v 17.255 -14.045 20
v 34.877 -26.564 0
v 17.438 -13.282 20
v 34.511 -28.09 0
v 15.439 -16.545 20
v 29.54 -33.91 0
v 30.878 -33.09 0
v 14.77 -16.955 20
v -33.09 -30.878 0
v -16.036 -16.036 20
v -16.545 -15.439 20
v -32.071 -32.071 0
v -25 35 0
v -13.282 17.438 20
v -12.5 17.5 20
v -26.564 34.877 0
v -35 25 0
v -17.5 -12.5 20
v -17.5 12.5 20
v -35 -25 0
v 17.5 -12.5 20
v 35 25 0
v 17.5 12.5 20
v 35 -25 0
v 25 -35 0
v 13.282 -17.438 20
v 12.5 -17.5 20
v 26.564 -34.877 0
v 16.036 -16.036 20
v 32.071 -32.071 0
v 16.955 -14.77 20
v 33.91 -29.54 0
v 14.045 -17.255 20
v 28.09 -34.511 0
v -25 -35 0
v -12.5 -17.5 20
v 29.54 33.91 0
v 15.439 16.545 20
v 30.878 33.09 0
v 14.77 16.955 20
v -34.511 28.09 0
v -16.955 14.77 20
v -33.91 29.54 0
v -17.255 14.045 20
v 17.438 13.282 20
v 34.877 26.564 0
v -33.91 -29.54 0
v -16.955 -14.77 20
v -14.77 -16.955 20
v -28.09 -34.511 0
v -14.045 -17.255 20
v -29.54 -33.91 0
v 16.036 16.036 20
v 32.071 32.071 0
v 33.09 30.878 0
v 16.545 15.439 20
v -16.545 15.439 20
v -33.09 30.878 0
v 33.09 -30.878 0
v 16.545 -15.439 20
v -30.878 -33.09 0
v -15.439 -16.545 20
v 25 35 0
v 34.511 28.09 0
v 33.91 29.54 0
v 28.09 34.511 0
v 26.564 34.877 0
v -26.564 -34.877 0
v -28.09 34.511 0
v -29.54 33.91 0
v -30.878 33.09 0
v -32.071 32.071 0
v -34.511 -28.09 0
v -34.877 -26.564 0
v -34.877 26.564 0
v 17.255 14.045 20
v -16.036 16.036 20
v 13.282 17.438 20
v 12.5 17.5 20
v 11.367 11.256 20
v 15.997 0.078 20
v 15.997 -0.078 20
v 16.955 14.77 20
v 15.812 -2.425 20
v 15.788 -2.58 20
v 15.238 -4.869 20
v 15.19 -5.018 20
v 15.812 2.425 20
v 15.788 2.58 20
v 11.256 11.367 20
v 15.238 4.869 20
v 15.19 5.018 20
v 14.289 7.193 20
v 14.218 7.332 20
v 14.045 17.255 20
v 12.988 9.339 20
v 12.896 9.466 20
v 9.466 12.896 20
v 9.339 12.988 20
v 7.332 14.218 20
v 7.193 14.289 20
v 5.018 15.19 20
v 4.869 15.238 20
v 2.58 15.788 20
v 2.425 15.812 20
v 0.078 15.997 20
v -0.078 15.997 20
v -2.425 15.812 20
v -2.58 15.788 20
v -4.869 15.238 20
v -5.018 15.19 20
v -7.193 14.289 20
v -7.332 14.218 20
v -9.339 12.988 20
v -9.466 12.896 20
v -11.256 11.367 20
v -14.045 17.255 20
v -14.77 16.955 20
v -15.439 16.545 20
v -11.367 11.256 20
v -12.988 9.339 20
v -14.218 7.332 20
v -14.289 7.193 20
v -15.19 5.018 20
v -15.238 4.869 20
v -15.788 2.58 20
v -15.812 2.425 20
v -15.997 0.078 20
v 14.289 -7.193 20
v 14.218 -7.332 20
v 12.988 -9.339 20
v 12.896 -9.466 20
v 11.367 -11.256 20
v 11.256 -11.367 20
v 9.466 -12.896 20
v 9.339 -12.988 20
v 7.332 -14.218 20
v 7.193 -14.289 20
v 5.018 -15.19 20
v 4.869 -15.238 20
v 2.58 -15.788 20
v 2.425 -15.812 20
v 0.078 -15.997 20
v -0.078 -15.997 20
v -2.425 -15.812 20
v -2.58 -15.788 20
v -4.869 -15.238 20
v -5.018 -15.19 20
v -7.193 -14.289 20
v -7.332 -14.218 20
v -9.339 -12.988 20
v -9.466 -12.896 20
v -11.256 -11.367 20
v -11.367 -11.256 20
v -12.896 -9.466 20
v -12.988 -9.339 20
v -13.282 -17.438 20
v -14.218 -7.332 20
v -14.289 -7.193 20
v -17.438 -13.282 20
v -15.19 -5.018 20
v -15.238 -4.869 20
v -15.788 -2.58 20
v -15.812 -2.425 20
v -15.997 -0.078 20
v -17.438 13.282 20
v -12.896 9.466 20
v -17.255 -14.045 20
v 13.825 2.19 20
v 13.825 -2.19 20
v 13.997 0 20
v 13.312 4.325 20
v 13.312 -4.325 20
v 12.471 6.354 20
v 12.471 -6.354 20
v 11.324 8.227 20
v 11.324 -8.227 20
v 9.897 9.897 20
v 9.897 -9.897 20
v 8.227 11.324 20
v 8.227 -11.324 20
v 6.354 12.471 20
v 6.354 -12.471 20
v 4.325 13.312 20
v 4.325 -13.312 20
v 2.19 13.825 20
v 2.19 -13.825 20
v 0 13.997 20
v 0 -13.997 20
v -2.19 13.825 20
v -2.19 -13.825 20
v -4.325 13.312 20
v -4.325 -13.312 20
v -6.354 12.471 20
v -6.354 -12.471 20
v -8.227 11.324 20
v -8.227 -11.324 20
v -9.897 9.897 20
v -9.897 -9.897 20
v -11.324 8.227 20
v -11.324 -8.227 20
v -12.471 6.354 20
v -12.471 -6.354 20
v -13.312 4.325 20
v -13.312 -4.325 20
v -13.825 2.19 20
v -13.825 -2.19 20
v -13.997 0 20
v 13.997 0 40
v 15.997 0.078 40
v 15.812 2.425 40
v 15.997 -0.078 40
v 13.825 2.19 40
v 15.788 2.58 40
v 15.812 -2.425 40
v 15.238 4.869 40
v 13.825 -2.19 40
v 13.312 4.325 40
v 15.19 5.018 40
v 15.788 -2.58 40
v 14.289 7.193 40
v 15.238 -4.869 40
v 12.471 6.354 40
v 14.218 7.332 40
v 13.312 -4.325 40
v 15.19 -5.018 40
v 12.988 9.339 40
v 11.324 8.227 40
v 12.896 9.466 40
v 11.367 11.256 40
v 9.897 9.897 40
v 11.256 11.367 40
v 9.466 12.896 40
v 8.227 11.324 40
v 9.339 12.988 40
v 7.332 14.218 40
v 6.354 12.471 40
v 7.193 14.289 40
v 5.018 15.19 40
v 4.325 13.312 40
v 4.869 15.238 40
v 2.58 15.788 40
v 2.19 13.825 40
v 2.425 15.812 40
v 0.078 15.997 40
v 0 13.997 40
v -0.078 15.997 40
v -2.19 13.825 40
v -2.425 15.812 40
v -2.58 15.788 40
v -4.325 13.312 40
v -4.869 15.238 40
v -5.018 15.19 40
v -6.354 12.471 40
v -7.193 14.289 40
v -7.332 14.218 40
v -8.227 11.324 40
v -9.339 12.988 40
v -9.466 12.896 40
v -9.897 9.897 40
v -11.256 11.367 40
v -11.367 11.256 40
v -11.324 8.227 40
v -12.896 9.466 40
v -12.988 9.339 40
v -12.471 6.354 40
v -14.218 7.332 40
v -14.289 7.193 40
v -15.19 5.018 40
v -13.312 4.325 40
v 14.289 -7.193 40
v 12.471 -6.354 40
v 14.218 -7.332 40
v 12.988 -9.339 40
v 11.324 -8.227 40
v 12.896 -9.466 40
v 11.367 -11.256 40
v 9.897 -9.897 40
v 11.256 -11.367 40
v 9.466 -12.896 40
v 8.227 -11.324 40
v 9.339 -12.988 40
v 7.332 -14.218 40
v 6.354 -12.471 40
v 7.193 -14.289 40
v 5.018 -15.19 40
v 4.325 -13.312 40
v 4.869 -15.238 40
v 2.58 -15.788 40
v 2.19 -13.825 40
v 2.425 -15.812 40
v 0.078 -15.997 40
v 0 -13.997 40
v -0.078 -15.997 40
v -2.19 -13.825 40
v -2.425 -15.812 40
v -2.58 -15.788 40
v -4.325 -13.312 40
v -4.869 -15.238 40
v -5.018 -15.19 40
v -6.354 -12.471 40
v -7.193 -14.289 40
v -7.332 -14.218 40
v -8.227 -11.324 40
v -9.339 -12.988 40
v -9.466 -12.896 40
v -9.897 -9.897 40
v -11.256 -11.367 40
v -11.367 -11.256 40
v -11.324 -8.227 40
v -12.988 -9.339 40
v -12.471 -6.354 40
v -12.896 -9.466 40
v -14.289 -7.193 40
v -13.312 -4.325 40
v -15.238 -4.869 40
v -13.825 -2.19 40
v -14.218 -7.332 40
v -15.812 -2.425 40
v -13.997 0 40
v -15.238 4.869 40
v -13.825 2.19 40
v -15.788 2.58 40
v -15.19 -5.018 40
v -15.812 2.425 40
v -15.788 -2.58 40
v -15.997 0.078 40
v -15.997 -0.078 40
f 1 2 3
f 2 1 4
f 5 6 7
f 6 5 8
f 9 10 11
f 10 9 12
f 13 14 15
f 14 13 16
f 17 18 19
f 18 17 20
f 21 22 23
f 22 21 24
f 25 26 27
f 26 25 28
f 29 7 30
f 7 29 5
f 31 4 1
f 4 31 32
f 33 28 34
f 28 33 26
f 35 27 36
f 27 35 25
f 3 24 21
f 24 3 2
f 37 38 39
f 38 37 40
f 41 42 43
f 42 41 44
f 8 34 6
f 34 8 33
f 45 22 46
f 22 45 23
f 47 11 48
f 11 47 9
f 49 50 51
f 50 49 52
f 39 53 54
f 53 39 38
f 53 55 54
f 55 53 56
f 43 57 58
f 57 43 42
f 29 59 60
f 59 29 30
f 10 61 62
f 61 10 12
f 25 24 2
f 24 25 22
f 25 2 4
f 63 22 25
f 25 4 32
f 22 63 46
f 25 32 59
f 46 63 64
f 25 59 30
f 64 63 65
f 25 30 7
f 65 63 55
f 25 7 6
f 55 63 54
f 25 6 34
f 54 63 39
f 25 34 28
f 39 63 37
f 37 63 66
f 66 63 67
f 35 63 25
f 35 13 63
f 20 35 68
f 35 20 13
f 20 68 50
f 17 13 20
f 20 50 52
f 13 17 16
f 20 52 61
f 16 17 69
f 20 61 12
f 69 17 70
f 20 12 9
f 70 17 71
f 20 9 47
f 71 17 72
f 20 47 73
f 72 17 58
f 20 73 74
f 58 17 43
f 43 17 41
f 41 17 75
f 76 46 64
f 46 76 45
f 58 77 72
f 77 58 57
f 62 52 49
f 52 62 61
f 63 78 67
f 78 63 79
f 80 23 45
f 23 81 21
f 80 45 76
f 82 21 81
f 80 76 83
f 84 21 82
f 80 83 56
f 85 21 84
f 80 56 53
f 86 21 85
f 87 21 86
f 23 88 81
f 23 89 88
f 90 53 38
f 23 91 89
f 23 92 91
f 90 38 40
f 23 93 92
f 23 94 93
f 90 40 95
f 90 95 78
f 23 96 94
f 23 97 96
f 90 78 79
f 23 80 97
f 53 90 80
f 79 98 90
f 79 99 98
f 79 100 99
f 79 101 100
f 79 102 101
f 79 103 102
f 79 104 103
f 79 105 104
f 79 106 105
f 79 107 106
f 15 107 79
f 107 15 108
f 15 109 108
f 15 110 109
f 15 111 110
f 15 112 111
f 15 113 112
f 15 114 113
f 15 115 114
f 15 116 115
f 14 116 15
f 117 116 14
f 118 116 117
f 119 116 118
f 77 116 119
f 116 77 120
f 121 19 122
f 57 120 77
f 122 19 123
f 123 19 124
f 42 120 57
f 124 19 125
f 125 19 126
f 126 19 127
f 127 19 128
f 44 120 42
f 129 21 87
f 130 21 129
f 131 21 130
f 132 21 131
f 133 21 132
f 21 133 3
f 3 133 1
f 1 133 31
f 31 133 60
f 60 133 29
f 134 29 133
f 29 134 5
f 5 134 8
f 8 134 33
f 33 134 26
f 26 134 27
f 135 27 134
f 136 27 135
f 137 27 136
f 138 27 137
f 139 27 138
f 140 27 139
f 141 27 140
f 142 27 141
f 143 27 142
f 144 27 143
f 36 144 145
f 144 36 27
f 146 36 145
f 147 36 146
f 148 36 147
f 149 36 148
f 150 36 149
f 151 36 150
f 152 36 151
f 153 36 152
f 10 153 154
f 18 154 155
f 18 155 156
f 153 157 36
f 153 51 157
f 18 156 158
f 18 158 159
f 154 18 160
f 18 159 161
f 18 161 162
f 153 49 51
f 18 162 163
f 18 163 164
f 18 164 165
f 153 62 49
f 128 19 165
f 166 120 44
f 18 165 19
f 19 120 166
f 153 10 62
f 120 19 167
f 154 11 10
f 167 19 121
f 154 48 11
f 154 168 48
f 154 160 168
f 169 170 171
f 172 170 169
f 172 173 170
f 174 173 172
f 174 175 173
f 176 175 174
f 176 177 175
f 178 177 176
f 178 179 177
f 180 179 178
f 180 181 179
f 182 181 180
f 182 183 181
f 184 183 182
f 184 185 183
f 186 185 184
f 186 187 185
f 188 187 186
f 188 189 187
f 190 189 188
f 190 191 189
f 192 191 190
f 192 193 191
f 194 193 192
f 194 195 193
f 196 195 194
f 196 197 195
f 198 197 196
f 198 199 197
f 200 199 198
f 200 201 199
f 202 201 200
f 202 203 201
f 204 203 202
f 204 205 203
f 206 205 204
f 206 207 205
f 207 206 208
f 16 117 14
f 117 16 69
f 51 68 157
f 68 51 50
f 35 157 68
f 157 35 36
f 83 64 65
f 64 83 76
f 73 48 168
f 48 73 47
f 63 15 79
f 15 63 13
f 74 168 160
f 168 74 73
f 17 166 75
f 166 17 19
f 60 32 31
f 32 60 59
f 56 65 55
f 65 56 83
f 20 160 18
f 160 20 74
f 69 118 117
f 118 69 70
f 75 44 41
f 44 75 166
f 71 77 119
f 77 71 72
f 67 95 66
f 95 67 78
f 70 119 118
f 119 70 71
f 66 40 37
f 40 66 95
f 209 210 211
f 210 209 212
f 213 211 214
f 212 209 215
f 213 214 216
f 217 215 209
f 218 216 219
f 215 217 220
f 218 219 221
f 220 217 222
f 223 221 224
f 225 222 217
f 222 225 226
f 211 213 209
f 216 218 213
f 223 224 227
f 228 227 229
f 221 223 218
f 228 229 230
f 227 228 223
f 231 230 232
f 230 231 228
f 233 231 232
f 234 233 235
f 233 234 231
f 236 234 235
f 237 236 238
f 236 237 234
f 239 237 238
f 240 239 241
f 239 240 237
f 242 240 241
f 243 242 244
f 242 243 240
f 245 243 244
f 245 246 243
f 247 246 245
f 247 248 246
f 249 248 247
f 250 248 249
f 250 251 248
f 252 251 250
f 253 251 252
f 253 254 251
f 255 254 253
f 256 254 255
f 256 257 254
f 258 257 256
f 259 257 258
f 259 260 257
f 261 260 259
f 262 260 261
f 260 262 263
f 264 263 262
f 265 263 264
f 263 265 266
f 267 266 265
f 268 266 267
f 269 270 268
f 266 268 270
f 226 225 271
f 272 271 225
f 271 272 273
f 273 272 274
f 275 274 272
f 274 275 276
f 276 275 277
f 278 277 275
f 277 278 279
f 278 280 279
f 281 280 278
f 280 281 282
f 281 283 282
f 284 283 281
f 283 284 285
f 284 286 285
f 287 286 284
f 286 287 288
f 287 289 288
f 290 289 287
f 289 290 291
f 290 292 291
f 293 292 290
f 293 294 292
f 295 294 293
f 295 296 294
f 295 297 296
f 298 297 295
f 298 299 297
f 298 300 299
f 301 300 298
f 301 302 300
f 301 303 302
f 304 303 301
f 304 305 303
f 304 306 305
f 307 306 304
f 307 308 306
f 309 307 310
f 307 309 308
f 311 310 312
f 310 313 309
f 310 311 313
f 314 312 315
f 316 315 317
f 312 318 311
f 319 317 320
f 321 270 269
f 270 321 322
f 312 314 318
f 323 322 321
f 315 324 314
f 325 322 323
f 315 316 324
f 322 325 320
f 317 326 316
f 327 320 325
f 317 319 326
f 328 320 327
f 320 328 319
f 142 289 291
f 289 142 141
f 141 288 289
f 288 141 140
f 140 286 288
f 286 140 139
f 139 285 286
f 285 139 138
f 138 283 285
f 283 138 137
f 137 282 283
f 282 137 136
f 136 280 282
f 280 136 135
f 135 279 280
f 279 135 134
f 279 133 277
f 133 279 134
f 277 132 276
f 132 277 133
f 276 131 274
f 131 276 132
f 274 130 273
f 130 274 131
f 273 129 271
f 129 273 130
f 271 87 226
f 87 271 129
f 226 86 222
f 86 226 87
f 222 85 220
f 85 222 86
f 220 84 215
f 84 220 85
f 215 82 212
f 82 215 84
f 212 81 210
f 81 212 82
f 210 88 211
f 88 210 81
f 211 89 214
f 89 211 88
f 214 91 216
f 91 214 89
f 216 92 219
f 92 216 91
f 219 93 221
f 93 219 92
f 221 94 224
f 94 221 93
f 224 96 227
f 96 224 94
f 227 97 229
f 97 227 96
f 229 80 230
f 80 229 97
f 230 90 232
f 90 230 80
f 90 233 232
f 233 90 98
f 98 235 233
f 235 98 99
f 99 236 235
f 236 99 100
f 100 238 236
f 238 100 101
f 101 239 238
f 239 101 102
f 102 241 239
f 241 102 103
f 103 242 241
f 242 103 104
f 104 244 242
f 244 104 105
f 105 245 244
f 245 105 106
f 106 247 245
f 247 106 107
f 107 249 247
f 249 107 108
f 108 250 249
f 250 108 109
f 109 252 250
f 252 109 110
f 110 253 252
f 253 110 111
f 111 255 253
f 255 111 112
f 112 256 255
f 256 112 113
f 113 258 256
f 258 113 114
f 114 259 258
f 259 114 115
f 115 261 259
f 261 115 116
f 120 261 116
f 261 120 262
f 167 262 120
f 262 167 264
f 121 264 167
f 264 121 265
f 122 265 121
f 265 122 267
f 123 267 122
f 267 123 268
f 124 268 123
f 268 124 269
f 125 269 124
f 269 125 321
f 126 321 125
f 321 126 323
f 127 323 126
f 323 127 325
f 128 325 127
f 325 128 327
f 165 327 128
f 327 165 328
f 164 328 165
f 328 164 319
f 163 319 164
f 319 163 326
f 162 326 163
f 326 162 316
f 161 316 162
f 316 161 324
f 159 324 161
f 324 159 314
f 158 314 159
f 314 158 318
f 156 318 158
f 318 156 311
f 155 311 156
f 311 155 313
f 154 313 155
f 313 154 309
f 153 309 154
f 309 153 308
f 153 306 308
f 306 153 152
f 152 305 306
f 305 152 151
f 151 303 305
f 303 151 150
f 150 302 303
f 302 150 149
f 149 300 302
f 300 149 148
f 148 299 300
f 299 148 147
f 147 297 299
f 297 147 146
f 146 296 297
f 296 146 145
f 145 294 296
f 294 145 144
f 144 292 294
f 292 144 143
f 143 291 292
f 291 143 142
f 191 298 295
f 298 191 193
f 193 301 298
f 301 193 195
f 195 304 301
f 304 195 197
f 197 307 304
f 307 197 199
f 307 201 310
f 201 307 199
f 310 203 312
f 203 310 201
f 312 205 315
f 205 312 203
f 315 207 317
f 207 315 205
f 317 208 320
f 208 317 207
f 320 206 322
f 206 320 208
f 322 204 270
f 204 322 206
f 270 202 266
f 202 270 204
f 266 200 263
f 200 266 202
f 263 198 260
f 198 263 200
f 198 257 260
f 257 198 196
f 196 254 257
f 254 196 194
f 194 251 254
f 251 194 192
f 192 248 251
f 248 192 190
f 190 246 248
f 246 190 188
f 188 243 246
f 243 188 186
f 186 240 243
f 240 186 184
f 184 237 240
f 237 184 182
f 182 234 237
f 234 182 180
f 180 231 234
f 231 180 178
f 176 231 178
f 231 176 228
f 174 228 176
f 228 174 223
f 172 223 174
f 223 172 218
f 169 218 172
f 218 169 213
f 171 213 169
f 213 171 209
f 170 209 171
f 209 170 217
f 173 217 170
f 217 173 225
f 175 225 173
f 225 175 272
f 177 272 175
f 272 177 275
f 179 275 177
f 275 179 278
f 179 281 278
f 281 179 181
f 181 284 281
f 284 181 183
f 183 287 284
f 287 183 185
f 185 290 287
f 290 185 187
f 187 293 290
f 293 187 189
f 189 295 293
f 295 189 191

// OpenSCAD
// offset.scad - Example for offset() usage in OpenSCAD

$fn = 40;

foot_height = 20;

echo(version=version());

module outline(wall = 1) {
	difference() {
		offset(wall / 2) children();
		offset(-wall / 2) children();
	}
}

// offsetting with a positive value and join_type = "round"
// allows to create rounded corners easily
linear_extrude(height = foot_height, scale = 0.5) {
  offset(10, join_type = "round") {
    square(50, center = true);
  }
}

translate([0, 0, foot_height]) {
	linear_extrude(height = 20) {
		outline(wall = 2) circle(15);
	}
}

%cylinder(r = 14, h = 100);
%translate([0, 0, 100]) sphere(r = 30);



// Written in 2014 by Torsten Paul &ltTorsten.Paul@gmx.de>
//
// To the extent possible under law, the author(s) have dedicated all
// copyright and related and neighboring rights to this software to the
// public domain worldwide. This software is distributed without any
// warranty.
//
// You should have received a copy of the CC0 Public Domain
// Dedication along with this software.
// If not, see &lthttp://creativecommons.org/publicdomain/zero/1.0/&gt.
